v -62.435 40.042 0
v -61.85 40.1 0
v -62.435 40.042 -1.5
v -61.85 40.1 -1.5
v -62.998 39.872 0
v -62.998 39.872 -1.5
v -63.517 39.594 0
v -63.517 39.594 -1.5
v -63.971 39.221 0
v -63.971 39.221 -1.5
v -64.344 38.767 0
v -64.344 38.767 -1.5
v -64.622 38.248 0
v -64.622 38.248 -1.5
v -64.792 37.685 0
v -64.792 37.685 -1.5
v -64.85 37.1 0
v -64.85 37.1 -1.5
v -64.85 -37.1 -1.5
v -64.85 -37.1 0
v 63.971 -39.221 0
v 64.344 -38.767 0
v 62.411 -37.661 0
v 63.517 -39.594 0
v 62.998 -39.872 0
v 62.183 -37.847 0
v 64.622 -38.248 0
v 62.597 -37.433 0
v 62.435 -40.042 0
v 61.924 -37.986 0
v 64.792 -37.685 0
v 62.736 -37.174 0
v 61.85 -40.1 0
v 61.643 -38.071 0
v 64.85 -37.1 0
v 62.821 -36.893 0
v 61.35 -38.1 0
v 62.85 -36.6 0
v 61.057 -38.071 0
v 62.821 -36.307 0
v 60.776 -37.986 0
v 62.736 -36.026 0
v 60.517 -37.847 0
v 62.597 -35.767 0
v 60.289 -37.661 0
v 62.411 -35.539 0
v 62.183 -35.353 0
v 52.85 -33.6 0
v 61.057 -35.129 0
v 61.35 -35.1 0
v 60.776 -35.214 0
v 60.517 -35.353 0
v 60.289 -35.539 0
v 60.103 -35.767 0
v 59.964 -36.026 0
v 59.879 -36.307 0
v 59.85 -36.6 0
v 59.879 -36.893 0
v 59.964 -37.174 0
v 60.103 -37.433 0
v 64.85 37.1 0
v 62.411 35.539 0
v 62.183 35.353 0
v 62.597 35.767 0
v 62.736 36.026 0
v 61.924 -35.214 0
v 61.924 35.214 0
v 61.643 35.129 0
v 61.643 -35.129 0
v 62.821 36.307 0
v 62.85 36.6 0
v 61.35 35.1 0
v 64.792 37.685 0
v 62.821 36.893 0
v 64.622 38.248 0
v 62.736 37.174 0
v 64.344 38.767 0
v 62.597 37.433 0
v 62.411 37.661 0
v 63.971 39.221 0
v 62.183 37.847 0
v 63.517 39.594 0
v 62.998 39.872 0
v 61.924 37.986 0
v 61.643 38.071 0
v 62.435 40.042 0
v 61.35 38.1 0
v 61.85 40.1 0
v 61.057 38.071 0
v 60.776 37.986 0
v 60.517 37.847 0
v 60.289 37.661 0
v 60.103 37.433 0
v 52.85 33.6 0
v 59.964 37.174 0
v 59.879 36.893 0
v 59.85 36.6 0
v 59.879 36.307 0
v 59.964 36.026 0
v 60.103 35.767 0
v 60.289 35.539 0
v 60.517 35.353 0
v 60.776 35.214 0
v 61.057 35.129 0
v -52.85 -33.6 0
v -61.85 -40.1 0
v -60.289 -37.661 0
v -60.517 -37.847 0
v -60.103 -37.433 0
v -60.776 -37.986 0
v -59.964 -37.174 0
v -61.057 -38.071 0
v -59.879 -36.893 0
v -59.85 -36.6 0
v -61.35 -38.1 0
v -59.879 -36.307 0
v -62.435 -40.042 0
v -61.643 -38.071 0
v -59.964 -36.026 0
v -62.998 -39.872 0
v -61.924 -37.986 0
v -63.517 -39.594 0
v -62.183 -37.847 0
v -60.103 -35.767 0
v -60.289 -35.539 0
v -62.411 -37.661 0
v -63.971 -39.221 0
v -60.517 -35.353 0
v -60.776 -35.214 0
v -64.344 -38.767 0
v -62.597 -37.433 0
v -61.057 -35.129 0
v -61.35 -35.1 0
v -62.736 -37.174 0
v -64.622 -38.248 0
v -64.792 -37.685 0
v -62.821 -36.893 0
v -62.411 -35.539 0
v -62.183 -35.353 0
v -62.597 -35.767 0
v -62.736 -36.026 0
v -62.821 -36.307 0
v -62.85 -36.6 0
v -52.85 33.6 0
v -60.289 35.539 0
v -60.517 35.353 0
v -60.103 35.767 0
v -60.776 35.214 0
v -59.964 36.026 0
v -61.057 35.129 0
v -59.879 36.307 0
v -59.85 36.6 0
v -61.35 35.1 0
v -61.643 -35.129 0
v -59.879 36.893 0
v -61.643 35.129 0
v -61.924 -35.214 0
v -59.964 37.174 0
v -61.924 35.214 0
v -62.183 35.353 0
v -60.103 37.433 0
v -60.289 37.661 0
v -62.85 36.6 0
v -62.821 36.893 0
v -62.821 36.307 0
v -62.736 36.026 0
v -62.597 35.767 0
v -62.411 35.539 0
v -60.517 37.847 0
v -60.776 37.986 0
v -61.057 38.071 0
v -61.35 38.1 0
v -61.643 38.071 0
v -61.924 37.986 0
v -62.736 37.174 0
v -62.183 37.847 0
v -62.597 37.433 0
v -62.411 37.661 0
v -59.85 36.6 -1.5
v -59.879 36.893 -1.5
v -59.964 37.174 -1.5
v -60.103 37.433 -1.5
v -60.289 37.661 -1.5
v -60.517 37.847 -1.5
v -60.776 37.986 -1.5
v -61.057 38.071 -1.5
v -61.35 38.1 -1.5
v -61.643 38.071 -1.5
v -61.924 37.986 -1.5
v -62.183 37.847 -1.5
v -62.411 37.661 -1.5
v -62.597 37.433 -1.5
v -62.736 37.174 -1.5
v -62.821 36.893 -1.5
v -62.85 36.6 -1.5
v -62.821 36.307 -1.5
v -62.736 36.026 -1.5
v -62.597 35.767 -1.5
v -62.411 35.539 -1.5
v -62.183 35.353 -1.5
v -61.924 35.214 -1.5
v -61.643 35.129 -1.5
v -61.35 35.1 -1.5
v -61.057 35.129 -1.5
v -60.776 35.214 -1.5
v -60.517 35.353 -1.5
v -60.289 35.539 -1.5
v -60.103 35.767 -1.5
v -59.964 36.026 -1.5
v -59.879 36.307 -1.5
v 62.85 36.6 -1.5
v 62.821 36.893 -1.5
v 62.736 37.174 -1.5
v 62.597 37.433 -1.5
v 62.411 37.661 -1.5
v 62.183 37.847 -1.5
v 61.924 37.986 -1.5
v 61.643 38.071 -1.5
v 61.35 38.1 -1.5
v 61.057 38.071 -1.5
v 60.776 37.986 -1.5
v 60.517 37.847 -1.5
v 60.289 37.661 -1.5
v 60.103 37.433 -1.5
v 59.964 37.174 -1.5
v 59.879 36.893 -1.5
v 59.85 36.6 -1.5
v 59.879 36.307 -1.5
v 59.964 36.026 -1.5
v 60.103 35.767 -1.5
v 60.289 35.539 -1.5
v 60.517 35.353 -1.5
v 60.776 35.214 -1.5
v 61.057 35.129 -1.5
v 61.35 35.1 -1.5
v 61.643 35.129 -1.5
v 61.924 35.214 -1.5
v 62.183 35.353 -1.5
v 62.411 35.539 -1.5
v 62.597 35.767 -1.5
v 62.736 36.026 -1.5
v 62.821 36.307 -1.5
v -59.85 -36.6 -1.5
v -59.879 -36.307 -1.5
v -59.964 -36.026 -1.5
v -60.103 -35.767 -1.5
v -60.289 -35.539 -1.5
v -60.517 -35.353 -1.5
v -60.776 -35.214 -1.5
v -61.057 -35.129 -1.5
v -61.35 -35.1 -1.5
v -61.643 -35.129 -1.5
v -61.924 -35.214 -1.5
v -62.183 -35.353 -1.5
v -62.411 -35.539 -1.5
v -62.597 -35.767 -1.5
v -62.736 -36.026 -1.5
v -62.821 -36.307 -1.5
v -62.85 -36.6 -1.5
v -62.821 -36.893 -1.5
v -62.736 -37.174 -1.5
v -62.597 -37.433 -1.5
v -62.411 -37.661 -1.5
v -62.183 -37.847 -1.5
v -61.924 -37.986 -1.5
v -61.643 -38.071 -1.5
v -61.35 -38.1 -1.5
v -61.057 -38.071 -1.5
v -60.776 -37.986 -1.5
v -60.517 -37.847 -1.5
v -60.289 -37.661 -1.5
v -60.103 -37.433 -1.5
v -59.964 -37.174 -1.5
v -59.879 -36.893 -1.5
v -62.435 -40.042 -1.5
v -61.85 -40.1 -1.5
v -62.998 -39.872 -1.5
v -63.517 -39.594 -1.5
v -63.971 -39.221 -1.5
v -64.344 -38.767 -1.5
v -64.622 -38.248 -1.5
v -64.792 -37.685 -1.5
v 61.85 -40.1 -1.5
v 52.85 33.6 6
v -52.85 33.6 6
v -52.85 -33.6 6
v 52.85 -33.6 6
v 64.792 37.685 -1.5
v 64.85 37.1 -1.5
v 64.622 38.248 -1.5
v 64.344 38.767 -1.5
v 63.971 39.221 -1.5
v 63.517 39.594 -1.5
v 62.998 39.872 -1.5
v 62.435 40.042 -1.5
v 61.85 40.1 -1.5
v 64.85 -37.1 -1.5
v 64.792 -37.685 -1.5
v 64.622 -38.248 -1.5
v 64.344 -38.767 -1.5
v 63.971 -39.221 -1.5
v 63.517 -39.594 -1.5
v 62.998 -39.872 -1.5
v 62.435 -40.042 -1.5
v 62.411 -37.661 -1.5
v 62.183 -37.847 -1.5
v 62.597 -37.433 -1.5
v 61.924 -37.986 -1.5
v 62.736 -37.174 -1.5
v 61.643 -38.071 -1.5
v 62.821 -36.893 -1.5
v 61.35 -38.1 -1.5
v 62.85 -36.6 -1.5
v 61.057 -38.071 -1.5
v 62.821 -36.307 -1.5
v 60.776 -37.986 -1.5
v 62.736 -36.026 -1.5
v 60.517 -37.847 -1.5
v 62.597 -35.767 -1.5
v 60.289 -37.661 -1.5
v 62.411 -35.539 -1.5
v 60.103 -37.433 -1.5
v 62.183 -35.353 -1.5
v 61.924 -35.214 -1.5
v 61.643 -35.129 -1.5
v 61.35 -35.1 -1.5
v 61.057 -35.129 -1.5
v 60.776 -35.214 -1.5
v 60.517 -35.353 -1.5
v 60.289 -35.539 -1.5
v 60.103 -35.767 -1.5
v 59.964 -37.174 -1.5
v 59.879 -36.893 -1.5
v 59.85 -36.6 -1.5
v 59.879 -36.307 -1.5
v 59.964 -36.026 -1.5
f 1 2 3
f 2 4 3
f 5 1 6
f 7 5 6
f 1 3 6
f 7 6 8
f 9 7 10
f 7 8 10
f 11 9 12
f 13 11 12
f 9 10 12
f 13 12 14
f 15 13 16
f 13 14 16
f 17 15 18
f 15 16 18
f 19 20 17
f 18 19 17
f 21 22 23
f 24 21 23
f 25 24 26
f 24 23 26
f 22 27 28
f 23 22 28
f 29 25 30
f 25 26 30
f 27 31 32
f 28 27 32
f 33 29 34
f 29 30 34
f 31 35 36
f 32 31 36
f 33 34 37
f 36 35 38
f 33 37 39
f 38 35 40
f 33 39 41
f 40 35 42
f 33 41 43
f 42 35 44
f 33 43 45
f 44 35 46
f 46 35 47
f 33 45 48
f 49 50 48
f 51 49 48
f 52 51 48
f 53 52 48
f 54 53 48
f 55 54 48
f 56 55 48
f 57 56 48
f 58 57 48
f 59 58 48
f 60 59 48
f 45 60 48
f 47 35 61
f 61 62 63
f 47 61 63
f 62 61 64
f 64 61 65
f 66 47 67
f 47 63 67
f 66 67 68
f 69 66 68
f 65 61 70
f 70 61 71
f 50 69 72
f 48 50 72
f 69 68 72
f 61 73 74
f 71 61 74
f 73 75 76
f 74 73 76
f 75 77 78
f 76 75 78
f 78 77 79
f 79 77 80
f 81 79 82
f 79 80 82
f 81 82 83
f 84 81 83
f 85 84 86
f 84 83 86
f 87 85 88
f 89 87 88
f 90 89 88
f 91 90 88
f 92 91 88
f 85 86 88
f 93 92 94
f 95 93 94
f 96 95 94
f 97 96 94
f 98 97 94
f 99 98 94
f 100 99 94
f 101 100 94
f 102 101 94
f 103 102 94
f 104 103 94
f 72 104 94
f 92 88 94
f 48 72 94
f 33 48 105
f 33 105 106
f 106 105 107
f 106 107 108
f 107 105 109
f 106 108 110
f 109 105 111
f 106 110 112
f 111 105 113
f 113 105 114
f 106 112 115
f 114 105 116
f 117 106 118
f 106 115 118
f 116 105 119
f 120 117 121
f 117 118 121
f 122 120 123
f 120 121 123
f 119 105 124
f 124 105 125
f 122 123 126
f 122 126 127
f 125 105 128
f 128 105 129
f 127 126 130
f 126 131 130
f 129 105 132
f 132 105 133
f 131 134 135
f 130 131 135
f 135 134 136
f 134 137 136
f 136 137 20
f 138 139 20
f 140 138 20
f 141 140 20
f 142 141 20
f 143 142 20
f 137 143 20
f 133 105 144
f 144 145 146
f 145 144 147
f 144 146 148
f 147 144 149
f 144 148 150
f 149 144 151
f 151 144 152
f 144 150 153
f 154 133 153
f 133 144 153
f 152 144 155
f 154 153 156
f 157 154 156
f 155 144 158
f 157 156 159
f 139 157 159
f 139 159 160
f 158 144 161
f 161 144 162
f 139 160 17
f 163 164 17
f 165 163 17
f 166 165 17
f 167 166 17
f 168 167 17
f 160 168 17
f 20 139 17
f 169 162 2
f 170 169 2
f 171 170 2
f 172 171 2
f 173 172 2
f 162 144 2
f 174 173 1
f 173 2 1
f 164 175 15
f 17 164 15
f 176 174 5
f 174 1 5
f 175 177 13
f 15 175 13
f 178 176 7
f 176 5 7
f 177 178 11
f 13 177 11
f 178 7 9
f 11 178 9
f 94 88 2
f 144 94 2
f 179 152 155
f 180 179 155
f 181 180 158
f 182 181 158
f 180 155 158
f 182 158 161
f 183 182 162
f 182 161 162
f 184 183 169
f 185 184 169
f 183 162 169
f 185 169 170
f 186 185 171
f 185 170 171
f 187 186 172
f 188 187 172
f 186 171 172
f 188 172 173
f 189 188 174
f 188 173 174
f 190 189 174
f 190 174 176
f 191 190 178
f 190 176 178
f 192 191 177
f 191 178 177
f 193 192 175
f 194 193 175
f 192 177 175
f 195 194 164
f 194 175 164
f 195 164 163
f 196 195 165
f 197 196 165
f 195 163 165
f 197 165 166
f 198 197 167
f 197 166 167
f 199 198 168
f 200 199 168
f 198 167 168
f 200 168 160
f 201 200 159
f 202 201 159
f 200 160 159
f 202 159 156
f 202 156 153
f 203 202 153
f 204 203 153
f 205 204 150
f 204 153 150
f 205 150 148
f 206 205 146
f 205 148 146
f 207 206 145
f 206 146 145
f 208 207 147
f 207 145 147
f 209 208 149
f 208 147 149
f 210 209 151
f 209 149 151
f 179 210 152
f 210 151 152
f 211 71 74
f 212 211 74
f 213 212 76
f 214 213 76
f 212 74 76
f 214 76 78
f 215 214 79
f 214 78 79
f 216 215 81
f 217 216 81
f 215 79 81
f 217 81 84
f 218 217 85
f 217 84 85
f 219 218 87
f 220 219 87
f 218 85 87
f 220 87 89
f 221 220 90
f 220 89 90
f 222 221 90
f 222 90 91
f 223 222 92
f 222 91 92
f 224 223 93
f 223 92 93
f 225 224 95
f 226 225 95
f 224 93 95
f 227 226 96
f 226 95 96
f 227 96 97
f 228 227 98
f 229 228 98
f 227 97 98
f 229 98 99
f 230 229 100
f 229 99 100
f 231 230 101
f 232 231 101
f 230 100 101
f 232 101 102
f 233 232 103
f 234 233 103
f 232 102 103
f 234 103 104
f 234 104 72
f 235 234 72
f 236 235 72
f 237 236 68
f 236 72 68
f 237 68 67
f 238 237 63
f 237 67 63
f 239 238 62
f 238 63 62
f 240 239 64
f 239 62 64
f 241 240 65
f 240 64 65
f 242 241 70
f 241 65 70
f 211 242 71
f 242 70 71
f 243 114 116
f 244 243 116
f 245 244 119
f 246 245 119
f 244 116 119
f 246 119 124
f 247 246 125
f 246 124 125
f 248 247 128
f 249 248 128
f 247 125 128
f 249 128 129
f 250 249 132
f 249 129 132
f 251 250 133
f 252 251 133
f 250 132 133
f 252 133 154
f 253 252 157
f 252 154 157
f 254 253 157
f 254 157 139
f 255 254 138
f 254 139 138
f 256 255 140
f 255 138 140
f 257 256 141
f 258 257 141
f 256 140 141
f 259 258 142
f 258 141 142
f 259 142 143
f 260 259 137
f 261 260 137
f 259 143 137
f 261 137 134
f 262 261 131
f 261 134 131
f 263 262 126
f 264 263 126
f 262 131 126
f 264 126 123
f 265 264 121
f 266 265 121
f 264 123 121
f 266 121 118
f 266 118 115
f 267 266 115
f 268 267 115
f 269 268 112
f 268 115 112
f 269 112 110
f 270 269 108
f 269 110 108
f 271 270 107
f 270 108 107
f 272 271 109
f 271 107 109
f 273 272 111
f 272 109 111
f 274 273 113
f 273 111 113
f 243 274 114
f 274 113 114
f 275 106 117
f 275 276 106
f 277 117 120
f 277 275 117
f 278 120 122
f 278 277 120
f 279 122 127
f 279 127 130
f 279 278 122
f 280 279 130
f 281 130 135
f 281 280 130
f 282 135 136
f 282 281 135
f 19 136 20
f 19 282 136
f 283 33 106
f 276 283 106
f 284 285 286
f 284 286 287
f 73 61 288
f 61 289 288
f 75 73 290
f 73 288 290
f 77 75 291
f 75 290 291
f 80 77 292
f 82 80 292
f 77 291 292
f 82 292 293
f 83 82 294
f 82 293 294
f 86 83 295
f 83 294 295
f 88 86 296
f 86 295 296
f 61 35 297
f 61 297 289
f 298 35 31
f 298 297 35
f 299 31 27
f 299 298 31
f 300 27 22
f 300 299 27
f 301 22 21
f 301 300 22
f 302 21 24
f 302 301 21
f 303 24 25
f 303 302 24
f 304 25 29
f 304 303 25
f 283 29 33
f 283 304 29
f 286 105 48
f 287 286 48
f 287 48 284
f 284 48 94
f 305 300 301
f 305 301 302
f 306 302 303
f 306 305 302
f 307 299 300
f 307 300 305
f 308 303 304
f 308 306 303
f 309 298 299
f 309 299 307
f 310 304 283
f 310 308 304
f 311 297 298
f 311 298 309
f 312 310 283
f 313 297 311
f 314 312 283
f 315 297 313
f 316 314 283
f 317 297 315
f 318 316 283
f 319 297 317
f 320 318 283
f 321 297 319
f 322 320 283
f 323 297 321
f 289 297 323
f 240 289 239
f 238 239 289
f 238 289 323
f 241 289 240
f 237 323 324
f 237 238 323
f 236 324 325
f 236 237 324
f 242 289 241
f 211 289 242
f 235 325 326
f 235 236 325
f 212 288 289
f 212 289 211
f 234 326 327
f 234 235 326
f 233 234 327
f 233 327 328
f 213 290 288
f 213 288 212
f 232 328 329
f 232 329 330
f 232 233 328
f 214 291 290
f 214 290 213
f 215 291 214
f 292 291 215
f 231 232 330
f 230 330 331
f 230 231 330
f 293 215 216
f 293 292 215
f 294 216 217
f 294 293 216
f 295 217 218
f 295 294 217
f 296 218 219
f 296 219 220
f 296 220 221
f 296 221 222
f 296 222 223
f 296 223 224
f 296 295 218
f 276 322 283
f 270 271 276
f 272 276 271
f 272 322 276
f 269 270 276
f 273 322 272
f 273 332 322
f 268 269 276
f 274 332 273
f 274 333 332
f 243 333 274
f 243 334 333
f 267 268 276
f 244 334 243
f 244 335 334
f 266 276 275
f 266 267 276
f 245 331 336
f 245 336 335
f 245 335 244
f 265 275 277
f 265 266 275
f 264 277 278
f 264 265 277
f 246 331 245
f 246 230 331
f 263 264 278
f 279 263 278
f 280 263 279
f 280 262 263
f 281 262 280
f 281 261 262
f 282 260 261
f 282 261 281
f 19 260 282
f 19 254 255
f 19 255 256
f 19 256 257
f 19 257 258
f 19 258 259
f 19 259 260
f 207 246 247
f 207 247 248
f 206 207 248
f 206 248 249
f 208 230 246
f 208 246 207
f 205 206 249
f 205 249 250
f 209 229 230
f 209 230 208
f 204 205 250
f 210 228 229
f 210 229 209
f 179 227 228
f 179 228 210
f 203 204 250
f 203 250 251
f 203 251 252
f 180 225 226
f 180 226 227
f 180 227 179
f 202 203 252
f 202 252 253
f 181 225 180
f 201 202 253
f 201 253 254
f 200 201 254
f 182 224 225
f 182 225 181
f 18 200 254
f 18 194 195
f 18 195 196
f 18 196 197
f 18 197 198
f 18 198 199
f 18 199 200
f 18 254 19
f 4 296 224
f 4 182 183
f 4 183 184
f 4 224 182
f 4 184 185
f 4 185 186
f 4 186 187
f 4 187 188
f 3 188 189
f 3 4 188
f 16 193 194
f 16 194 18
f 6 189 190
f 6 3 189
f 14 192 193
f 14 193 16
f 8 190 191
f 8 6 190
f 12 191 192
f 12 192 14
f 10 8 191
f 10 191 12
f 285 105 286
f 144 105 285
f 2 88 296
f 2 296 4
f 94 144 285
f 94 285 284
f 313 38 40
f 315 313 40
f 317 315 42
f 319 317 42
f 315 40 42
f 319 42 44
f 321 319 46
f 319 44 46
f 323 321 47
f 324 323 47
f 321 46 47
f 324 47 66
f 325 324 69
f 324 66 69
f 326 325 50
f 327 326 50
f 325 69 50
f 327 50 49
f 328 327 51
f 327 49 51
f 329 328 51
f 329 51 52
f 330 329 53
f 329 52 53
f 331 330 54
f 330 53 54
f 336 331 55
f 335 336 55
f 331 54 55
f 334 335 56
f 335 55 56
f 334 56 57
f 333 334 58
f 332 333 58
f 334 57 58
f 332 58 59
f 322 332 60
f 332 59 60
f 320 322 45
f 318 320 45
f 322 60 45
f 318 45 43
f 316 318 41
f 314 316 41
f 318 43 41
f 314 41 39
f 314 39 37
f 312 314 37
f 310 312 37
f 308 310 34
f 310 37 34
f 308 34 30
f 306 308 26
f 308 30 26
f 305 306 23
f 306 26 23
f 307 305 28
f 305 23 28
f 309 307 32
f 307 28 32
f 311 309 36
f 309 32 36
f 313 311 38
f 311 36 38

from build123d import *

# Parameters (mm, degrees)
SKETCH1_W           = 105.7
SKETCH1_H           = 67.2
BOSS_EXTRUDE1_DEPTH = 6
SKETCH2_W           = 129.7
SKETCH2_H           = 80.2
BOSS_EXTRUDE2_DEPTH = 1.5
SKETCH3_R           = 1.5
CUT_EXTRUDE1_DEPTH  = 1.5
FILLET1_R           = 3


with BuildPart() as part:
    # Sketch1 → Boss-Extrude1 (new body)
    with BuildSketch(Plane.XY):
        Rectangle(SKETCH1_W, SKETCH1_H)
    extrude(amount=BOSS_EXTRUDE1_DEPTH)

    # Sketch2 → Boss-Extrude2 (add)
    with BuildSketch(Plane(origin=(0, 0, 0), x_dir=(-1, 0, 0), z_dir=(0, 0, -1))):
        Rectangle(SKETCH2_W, SKETCH2_H)
    extrude(amount=BOSS_EXTRUDE2_DEPTH)

    # Sketch3 → Cut-Extrude1 (cut)
    with BuildSketch(Plane.XY):
        with Locations((61.35, 36.6)):
            Circle(SKETCH3_R)
        with Locations((61.35, -36.6)):
            Circle(SKETCH3_R)
        with Locations((-61.35, -36.6)):
            Circle(SKETCH3_R)
        with Locations((-61.35, 36.6)):
            Circle(SKETCH3_R)
    extrude(amount=-CUT_EXTRUDE1_DEPTH, mode=Mode.SUBTRACT)

    # Fillet1
    fillet1_edges = [part.edges().sort_by_distance(p)[0] for p in [
        (-64.85, -40.1, -0.75),
        (-64.85, 40.1, -0.75),
        (64.85, 40.1, -0.75),
        (64.85, -40.1, -0.75),
    ]]
    fillet(fillet1_edges, radius=FILLET1_R)


solid = part.part
